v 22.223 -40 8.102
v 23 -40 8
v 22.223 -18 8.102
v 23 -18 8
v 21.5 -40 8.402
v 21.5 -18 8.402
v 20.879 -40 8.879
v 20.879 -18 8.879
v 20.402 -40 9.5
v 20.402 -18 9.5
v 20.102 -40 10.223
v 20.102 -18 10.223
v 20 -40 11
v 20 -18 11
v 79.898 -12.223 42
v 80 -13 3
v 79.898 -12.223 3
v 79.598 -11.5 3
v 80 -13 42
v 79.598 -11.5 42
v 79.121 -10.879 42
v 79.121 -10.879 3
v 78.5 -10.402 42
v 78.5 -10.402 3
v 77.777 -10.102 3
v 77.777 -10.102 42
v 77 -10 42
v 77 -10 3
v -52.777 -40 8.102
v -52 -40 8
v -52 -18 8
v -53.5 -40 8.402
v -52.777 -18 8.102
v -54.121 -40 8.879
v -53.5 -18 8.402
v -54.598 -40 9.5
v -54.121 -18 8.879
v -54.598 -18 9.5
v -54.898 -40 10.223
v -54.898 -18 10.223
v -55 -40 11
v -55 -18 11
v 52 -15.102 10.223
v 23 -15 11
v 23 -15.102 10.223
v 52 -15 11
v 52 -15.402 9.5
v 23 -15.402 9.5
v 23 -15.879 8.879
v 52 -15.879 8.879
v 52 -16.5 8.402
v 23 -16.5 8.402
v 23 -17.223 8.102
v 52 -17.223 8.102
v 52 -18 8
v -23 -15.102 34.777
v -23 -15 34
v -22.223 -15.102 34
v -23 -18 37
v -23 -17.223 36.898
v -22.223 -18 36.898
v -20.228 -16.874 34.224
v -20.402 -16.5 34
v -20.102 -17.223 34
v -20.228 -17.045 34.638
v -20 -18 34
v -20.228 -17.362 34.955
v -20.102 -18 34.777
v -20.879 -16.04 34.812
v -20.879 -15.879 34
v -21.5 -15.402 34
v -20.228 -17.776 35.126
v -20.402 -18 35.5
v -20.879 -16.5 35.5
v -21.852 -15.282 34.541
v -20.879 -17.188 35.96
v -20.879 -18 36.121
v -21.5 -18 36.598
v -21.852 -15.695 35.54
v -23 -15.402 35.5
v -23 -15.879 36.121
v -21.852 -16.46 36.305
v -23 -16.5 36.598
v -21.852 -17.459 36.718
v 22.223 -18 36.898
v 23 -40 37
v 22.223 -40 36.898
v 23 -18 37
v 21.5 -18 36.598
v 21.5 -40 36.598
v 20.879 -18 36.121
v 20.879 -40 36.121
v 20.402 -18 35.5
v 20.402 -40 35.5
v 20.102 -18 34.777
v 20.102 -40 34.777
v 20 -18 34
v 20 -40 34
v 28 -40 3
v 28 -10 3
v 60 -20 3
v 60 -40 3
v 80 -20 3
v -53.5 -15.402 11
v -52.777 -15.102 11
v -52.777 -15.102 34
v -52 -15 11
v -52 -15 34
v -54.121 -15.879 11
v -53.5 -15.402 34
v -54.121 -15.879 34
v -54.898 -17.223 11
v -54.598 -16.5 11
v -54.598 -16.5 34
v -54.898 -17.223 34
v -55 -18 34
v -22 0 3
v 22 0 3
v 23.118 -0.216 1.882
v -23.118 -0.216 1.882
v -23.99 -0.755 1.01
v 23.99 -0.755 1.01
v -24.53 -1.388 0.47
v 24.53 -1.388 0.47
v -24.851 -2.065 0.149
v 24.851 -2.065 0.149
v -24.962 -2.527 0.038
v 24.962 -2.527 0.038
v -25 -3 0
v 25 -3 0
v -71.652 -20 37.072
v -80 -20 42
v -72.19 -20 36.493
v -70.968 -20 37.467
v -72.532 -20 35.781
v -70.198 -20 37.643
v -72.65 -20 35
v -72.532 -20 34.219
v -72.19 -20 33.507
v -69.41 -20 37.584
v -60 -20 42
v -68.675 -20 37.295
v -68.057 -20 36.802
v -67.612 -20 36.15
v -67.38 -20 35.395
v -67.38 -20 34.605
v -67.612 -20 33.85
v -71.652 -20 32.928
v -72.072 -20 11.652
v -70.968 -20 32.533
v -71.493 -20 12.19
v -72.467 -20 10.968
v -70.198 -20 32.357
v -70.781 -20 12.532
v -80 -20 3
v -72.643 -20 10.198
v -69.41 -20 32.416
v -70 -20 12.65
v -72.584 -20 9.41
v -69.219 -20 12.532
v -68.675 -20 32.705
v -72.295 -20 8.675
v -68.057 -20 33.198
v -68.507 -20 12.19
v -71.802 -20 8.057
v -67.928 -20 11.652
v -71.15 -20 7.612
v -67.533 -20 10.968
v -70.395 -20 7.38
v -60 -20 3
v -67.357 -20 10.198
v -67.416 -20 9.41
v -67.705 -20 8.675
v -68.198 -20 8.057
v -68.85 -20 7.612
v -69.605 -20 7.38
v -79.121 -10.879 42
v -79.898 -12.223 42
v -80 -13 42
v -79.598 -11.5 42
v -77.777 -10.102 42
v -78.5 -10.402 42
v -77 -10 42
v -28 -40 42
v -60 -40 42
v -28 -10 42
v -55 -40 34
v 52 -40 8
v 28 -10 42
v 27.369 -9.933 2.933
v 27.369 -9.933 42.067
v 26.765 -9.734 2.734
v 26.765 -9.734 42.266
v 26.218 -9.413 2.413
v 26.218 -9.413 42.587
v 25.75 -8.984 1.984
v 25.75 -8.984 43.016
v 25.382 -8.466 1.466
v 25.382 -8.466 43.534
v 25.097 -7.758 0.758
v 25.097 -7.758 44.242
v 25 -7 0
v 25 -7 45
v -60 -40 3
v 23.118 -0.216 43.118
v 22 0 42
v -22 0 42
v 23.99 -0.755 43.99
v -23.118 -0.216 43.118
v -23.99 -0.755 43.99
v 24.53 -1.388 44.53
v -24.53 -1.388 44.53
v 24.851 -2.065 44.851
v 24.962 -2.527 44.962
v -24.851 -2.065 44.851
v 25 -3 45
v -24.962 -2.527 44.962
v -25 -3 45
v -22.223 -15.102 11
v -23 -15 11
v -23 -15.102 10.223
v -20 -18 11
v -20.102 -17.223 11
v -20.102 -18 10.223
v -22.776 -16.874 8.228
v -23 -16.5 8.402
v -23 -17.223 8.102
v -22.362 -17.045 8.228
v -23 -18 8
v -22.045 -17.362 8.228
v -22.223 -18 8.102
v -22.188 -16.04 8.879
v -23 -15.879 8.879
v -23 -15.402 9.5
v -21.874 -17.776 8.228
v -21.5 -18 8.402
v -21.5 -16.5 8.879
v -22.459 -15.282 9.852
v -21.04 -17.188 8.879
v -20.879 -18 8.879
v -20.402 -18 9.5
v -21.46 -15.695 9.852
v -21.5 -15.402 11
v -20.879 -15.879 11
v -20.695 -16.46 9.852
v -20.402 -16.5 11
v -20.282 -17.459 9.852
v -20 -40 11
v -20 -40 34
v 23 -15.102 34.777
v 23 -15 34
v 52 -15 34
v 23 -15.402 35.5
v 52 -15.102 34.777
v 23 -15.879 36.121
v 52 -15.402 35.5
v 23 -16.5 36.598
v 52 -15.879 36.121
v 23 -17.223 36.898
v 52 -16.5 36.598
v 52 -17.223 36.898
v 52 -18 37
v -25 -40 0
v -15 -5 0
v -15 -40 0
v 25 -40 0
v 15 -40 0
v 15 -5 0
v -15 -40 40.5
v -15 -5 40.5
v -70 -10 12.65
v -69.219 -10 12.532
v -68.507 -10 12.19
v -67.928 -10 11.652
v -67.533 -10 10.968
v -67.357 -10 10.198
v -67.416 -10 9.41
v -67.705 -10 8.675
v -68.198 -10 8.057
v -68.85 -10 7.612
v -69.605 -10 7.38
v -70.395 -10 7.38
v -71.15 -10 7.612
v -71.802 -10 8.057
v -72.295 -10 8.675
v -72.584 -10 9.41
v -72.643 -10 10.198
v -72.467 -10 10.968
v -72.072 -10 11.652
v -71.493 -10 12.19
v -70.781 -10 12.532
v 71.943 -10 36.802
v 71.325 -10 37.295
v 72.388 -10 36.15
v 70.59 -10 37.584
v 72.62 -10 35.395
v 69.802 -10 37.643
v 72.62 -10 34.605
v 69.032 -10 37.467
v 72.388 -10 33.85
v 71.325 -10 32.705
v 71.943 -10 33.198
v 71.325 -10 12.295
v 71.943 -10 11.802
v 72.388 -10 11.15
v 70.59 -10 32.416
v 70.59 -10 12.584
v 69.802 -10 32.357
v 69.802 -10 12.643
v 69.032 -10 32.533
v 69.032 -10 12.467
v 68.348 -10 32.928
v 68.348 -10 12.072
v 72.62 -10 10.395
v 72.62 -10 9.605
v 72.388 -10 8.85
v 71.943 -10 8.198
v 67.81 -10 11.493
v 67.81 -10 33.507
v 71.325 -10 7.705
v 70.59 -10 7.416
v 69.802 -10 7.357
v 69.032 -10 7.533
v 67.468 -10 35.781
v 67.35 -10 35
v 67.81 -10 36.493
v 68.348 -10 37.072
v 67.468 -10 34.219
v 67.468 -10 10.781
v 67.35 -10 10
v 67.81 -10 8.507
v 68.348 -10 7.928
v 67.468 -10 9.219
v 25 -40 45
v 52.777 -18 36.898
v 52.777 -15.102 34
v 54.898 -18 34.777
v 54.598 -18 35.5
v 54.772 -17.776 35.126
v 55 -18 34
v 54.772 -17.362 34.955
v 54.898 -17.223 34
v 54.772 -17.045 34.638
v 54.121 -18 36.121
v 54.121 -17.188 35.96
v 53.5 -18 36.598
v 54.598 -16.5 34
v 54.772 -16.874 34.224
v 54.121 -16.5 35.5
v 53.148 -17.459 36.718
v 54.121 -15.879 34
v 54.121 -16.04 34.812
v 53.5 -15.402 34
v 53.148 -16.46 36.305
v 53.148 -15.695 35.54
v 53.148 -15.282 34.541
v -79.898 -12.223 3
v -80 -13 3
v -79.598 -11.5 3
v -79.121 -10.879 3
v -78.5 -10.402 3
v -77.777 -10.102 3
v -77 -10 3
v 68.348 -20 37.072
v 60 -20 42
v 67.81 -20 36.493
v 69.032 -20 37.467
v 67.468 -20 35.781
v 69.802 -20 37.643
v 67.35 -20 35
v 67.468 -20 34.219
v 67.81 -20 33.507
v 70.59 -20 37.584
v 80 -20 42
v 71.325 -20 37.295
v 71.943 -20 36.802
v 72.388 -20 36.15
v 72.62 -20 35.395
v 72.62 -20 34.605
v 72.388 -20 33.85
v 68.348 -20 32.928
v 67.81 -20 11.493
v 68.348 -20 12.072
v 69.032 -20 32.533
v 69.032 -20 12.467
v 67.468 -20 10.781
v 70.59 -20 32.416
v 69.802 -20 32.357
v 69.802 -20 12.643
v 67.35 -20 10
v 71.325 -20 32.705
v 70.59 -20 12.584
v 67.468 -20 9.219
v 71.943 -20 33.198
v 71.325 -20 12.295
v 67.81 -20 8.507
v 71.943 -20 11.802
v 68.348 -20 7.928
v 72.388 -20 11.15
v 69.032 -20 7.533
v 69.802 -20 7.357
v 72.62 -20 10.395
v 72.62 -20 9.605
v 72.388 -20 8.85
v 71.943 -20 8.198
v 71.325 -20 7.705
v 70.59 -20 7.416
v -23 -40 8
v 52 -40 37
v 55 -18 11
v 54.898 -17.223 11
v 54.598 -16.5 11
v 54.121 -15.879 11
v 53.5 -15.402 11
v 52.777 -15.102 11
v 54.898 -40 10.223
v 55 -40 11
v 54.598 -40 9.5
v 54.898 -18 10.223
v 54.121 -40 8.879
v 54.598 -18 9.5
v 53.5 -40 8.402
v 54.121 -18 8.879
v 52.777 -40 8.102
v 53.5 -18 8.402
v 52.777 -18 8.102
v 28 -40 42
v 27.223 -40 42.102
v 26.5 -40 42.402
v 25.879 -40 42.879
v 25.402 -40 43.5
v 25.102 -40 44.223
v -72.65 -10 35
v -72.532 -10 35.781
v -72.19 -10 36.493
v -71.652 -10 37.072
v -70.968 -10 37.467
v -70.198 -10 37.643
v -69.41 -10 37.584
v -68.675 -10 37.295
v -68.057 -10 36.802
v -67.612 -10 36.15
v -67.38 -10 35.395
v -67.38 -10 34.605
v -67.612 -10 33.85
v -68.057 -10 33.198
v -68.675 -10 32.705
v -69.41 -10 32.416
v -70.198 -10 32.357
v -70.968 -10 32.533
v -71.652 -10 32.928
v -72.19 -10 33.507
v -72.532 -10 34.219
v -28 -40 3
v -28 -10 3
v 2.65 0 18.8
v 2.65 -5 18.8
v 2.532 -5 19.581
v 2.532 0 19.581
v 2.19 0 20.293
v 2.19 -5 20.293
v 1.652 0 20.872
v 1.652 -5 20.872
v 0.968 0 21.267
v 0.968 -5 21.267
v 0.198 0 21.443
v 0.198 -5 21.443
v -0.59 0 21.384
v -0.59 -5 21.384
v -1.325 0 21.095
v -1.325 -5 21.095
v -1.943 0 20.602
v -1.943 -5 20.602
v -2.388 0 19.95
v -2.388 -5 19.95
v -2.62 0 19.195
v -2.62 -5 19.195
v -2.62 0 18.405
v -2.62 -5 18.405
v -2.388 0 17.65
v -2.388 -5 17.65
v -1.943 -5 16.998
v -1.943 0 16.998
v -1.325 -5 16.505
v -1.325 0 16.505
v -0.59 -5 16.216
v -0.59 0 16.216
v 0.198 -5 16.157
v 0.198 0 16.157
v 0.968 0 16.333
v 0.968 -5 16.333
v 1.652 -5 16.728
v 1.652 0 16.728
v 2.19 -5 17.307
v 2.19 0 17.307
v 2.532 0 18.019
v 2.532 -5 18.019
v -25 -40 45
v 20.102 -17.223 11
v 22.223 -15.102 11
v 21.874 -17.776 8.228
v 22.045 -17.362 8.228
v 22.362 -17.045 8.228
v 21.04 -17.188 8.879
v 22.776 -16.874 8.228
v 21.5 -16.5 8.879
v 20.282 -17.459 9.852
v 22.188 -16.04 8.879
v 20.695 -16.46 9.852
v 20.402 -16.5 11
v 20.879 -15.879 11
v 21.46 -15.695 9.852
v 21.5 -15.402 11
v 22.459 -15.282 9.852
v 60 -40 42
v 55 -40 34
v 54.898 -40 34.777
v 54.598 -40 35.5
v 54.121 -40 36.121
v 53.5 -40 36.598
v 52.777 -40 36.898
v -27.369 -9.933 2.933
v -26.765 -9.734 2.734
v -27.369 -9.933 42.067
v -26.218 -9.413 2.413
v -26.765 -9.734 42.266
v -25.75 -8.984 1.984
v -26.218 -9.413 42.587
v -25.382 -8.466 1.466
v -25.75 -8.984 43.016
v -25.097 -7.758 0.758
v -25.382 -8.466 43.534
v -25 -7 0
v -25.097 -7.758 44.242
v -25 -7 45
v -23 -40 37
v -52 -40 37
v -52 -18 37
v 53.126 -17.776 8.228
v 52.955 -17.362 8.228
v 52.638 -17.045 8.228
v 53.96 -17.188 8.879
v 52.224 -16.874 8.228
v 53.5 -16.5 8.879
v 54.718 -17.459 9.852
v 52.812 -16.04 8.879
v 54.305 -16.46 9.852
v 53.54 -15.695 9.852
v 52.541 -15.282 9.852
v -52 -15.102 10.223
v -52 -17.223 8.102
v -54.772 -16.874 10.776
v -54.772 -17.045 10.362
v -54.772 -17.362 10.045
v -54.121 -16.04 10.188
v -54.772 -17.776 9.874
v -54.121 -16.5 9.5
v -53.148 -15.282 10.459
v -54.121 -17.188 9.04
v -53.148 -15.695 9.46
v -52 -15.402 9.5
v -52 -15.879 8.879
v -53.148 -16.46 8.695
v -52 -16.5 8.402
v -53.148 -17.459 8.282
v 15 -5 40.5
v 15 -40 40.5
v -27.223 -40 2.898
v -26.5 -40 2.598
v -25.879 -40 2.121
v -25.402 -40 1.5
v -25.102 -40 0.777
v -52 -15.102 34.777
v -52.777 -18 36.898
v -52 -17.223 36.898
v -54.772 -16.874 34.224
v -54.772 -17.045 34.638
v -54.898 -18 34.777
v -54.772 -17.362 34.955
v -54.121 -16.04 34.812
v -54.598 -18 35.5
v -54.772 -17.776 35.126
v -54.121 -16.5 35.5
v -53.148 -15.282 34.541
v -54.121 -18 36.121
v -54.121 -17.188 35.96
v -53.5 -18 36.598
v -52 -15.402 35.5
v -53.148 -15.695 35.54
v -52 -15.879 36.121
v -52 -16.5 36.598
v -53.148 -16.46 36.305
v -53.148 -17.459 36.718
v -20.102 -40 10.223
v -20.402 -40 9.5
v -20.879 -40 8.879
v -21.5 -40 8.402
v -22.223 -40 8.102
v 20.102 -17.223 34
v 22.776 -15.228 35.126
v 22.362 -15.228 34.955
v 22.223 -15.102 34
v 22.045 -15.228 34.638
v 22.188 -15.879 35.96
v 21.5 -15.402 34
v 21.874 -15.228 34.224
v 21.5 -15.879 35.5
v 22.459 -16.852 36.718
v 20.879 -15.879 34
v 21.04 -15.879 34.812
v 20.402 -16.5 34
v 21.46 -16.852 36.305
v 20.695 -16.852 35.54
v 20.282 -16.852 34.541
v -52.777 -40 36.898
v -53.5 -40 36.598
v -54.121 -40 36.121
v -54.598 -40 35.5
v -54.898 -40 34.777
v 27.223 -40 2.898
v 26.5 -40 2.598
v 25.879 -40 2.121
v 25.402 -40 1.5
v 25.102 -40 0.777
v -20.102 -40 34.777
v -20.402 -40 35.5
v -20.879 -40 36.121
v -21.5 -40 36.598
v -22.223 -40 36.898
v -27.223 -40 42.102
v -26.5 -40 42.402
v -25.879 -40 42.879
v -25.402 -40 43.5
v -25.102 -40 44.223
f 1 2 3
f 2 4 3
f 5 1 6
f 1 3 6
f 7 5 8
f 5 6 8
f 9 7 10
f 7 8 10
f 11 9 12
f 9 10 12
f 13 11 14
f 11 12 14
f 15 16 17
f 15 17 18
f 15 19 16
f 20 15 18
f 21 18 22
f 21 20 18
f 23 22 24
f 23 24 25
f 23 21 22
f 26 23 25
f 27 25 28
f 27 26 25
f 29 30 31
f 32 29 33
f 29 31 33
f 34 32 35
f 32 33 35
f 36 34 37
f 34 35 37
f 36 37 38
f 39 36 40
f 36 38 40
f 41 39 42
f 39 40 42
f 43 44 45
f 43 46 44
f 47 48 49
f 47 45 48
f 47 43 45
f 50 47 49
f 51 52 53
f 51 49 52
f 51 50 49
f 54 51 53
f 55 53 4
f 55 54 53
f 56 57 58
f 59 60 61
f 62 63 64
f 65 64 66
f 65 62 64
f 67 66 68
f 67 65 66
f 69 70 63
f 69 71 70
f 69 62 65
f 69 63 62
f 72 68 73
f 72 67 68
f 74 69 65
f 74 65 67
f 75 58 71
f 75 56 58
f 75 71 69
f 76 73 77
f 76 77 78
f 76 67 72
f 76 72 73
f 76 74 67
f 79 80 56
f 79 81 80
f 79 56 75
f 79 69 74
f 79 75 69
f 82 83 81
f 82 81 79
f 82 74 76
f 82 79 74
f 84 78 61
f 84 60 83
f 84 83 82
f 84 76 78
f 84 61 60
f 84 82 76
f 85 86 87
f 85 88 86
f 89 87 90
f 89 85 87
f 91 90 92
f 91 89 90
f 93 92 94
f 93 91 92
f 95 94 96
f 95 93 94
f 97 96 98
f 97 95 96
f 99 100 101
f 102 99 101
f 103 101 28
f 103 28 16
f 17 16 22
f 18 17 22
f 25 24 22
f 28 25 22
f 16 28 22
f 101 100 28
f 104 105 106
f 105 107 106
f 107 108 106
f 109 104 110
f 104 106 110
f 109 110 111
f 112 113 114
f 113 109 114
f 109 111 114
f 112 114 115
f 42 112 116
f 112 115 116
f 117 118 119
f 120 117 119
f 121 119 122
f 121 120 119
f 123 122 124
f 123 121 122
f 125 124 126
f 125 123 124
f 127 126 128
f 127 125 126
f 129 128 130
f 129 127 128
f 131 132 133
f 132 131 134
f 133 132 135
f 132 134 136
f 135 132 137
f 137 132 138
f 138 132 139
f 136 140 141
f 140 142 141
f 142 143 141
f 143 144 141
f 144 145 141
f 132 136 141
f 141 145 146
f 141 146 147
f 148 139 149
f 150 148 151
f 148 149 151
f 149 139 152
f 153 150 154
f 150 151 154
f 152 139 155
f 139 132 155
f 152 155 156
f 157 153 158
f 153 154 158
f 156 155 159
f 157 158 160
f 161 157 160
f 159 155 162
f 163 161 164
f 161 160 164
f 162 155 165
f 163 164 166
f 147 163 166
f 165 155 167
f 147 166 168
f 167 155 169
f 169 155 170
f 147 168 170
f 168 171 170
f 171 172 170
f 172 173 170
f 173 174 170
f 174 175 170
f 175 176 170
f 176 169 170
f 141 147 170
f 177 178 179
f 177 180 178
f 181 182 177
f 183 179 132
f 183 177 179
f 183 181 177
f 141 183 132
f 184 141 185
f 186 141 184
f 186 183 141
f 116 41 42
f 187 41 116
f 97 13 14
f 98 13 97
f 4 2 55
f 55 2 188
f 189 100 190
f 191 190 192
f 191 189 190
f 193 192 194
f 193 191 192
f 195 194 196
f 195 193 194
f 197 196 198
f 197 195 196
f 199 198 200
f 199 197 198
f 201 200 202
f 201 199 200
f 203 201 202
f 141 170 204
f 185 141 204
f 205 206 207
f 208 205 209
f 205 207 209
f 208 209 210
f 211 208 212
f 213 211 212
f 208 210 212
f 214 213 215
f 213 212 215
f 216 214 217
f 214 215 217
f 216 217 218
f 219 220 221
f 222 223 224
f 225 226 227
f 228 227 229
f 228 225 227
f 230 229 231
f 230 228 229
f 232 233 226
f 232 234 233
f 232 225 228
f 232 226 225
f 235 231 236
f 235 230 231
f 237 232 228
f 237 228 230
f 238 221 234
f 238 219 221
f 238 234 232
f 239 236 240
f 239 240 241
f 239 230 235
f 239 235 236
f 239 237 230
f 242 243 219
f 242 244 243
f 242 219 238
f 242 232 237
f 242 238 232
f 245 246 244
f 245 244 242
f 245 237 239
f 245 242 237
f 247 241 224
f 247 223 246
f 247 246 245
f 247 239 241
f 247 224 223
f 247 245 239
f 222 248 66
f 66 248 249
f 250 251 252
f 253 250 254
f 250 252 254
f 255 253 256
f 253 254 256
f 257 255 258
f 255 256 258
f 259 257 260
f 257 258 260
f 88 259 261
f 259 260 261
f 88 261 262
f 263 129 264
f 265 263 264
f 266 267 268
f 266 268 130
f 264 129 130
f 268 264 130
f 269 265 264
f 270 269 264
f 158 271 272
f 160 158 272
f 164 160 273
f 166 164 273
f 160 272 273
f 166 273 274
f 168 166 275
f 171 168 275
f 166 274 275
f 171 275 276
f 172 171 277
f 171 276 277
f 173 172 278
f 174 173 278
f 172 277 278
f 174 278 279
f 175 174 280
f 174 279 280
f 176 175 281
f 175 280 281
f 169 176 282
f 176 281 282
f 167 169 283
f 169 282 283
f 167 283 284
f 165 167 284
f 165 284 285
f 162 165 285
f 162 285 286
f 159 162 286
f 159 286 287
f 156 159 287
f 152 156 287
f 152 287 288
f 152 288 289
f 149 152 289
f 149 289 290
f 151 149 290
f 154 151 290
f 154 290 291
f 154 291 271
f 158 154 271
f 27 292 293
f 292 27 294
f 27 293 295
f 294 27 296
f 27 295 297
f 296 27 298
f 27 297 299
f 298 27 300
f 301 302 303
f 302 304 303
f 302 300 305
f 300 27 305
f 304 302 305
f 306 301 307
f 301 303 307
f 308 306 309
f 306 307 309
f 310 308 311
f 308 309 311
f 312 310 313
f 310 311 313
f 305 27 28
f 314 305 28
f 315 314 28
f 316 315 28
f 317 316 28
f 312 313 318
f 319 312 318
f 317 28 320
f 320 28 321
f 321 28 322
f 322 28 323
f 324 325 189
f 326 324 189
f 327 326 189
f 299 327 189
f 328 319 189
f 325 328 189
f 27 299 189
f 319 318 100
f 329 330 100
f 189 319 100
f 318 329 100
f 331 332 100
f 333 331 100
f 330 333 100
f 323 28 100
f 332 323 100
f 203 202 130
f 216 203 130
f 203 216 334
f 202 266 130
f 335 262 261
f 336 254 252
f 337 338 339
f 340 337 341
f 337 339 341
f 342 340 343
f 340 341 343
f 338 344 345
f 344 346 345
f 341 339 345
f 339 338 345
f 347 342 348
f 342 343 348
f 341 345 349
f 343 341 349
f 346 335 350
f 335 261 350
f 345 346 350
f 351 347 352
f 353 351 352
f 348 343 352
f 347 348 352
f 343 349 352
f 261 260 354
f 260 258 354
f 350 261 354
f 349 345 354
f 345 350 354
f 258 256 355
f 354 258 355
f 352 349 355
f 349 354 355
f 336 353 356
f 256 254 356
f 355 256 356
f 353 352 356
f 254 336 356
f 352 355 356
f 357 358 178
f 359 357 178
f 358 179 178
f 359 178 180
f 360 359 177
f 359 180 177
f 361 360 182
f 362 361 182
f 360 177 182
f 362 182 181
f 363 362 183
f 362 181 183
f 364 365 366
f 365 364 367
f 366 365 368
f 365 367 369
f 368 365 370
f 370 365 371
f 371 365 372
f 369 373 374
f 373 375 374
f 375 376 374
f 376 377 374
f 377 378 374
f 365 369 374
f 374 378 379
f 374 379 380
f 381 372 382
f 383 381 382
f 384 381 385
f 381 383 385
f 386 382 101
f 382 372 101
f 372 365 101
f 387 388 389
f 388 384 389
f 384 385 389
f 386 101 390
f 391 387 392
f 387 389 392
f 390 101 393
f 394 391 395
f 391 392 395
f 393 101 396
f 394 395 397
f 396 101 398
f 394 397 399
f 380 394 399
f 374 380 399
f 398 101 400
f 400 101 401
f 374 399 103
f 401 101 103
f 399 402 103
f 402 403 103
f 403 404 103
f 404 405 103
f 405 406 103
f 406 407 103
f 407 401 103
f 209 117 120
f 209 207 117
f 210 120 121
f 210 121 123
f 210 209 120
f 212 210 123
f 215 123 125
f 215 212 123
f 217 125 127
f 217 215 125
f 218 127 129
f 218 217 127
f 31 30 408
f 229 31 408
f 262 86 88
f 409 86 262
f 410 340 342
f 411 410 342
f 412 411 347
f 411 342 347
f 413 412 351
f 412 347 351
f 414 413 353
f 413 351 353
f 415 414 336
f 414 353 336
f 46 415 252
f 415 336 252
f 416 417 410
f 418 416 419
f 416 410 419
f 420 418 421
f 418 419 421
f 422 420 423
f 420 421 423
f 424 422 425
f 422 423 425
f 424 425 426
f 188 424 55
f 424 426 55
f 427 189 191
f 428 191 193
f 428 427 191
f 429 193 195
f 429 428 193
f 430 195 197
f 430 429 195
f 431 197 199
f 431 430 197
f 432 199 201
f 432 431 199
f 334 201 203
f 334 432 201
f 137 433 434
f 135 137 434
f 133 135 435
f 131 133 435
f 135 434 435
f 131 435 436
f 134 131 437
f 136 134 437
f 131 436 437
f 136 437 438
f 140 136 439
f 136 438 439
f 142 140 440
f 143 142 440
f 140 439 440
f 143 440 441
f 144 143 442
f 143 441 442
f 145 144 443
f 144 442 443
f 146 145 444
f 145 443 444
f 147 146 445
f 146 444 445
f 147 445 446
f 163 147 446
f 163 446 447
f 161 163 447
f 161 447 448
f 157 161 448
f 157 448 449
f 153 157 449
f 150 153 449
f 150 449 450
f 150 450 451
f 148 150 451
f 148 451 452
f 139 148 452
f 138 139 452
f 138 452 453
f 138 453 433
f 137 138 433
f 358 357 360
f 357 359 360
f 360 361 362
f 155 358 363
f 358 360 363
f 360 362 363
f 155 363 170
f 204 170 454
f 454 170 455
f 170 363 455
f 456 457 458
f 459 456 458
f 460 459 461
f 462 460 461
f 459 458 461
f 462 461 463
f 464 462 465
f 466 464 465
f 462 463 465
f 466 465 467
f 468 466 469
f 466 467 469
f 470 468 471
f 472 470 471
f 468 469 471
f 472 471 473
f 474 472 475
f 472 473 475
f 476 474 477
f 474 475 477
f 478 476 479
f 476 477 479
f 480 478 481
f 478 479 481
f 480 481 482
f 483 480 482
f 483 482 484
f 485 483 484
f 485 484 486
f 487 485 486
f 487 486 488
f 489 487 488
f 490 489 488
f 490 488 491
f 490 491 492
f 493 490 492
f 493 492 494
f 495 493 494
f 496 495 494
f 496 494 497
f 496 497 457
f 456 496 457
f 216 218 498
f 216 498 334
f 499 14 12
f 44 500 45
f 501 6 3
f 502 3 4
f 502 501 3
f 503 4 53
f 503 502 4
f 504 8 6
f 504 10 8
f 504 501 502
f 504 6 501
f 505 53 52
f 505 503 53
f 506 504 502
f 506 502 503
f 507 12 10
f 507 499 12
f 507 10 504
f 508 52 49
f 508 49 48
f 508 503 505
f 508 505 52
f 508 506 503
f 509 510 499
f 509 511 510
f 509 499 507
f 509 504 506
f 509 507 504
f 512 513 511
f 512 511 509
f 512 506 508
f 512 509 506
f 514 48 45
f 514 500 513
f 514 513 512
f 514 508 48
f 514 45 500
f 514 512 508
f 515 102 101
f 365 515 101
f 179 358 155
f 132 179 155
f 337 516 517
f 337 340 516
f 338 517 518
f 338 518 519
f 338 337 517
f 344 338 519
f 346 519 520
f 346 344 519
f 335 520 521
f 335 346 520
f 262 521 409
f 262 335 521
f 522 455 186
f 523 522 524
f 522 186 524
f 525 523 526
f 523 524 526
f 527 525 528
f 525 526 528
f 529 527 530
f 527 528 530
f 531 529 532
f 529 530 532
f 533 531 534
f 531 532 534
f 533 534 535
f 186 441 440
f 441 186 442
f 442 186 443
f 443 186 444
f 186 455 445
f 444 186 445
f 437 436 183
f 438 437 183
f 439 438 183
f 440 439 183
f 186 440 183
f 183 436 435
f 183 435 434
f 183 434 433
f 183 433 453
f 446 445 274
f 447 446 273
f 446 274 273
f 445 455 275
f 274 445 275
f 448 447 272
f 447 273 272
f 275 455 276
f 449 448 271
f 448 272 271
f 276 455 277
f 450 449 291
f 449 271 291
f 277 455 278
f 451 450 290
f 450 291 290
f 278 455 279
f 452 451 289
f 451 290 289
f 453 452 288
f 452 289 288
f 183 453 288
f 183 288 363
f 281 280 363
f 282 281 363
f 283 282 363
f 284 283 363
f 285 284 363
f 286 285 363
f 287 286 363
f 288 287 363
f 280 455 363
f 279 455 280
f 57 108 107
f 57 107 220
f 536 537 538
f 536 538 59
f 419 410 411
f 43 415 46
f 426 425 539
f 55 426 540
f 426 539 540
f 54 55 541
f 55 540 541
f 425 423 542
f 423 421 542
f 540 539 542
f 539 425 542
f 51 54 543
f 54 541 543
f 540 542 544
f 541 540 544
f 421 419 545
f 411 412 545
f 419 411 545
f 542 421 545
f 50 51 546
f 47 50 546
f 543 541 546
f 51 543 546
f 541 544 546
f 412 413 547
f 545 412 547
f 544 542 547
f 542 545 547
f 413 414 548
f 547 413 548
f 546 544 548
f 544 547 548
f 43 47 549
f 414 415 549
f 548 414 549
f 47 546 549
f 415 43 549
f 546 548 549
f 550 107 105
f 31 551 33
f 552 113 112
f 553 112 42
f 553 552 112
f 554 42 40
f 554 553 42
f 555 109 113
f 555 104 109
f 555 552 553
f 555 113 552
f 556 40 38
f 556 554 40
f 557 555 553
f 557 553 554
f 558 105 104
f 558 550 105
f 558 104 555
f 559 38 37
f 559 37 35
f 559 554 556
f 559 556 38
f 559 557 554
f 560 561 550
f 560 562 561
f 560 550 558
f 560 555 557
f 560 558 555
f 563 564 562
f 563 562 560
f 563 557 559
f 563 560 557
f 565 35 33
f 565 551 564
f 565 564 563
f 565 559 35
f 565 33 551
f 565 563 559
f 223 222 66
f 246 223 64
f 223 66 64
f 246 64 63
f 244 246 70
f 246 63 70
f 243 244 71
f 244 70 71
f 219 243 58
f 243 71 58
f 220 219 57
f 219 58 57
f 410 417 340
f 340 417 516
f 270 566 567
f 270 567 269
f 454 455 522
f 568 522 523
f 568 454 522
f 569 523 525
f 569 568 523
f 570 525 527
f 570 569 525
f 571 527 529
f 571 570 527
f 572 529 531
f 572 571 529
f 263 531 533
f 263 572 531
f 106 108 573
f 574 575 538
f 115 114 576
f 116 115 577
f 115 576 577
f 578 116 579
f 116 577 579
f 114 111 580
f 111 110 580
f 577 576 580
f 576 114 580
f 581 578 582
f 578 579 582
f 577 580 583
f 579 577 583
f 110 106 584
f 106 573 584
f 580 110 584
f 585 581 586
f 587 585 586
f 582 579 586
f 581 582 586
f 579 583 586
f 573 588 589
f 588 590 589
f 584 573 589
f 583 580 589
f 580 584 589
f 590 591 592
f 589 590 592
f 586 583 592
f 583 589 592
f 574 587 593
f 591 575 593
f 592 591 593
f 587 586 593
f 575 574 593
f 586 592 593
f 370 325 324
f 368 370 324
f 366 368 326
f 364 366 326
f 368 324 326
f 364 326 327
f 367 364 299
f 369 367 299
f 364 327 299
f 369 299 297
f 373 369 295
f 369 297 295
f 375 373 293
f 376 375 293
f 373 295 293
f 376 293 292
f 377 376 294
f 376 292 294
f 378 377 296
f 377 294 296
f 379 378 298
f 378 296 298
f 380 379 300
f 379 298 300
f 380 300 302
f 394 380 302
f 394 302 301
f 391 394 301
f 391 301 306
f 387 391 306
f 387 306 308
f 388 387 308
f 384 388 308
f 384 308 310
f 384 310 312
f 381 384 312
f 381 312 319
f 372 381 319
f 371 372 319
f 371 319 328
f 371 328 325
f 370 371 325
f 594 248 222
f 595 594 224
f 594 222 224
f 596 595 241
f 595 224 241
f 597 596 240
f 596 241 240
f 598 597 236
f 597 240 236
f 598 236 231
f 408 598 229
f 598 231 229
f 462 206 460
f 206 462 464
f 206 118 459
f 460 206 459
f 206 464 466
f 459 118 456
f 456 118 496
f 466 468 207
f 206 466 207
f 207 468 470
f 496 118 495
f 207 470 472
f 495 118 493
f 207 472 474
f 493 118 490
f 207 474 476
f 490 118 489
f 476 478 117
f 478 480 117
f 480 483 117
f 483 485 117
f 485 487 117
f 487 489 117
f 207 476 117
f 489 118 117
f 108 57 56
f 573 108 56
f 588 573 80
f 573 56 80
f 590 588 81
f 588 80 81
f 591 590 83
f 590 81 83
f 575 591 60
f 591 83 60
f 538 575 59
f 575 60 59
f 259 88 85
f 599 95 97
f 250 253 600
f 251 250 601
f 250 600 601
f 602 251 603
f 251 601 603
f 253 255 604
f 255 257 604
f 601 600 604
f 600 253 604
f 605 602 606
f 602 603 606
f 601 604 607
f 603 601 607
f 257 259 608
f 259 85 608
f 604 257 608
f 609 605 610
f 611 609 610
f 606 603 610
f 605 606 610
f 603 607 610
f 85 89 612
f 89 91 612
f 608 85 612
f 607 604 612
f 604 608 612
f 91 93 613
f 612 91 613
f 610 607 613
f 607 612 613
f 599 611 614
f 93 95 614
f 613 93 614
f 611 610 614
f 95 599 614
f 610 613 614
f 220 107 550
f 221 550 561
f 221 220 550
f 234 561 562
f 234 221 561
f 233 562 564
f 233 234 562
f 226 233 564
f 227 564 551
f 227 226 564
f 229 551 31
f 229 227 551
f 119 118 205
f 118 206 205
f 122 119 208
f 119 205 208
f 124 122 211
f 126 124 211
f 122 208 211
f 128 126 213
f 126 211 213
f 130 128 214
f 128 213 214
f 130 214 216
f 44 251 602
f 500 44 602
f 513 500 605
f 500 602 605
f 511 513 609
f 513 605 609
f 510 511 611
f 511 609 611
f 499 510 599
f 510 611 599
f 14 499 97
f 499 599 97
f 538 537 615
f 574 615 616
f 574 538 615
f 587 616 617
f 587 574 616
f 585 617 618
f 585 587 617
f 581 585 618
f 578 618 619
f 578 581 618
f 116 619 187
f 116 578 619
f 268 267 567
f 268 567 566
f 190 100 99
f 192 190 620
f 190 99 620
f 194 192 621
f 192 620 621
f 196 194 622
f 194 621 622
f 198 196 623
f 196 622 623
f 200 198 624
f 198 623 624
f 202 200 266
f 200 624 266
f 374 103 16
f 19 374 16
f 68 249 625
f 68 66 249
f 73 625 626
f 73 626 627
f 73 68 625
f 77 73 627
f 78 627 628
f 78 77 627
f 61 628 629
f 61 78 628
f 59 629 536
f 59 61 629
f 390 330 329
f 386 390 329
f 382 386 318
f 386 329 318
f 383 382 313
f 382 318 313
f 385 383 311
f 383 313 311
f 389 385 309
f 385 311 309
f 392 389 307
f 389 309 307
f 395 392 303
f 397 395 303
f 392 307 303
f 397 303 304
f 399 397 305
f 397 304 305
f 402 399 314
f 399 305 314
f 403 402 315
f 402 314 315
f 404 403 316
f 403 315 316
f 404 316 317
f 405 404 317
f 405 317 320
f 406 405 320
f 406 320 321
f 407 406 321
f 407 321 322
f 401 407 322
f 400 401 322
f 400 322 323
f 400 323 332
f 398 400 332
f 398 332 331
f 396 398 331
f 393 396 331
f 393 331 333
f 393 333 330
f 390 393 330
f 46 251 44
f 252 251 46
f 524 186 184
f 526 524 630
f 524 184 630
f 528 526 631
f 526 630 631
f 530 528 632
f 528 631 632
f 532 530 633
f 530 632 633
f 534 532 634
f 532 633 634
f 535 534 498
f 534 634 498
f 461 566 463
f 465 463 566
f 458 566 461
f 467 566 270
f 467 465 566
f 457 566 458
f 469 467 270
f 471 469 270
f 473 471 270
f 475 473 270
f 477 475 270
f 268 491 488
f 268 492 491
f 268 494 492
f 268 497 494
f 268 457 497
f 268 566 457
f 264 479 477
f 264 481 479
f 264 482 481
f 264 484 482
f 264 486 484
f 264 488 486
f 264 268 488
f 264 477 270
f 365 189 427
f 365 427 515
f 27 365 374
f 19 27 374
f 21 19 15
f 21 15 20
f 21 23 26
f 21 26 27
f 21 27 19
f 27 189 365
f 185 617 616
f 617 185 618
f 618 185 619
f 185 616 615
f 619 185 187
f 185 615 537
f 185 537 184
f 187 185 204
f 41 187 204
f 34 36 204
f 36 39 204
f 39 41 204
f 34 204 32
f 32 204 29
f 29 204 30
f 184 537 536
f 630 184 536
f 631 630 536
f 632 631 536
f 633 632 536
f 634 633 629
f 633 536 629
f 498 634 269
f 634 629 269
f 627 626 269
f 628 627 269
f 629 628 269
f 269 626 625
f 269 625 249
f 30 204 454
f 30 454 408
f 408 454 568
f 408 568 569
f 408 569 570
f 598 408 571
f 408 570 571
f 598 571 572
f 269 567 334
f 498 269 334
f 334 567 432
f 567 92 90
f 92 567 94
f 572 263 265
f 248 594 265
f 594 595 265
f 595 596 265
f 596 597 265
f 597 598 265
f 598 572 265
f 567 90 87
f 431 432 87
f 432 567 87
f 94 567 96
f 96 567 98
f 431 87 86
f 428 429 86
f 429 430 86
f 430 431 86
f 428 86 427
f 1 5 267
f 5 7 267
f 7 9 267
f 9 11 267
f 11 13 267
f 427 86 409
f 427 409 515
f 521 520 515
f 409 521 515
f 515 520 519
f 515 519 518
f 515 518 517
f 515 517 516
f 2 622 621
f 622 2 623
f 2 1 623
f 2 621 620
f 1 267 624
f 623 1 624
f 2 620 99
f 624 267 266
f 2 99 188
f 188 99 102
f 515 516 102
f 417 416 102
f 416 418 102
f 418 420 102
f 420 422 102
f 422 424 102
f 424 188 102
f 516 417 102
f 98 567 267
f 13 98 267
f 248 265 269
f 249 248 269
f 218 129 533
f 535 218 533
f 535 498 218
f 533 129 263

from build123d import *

# Parameters (mm, degrees)
EXTRUDE_1_DEPTH     = 45
SKETCH_2_W          = 30
SKETCH_2_H          = 35
CUT_EXTRUDE_1_DEPTH = 40.5
SKETCH_4_R          = 2.65
CUT_EXTRUDE_2_DEPTH = 40
SKETCH_5_W          = 35
SKETCH_5_H          = 29
CUT_EXTRUDE_3_DEPTH = 25
SKETCH_6_R          = 2.65
CUT_EXTRUDE_4_DEPTH = 97.566039579
SKETCH_7_W          = 55
SKETCH_7_H          = 3
CUT_EXTRUDE_5_DEPTH = 97.566039579
FILLET_1_R          = 3


with BuildPart() as part:
    # 草图1 → 凸台-拉伸1 (new body)
    with BuildSketch(Plane.XY):
        Polygon((25, 0), (-25, 0), (-25, -10), (-80, -10), (-80, -20), (-60, -20), (-60, -40), (60, -40), (60, -20), (80, -20), (80, -10), (25, -10), align=None)
    extrude(amount=EXTRUDE_1_DEPTH)

    # 草图2 → 切除-拉伸1 (cut)
    with BuildSketch(Plane(origin=(0, 0, 0), x_dir=(-1, 0, 0), z_dir=(0, 0, -1))):
        with Locations((0, -22.5)):
            Rectangle(SKETCH_2_W, SKETCH_2_H)
    extrude(amount=-CUT_EXTRUDE_1_DEPTH, mode=Mode.SUBTRACT)

    # 草图4 → 切除-拉伸2 (cut)
    with BuildSketch(Plane.XZ.offset(5)):
        with Locations((0, 18.8)):
            Circle(SKETCH_4_R)
    extrude(amount=-CUT_EXTRUDE_2_DEPTH, mode=Mode.SUBTRACT)

    # 草图5 → 切除-拉伸3 (cut)
    with BuildSketch(Plane.XZ.offset(40)):
        with Locations((-37.5, 22.5)):
            Rectangle(SKETCH_5_W, SKETCH_5_H)
        with Locations((37.5, 22.5)):
            Rectangle(SKETCH_5_W, SKETCH_5_H)
    extrude(amount=-CUT_EXTRUDE_3_DEPTH, mode=Mode.SUBTRACT)

    # 草图6 → 切除-拉伸4 (cut, through all)
    with BuildSketch(Plane(origin=(0, -10, 0), x_dir=(1, 0, 0), z_dir=(0, 1, 0))):
        with Locations(Location((70, -10, 0), (0, 0, 180))):
            Circle(SKETCH_6_R)
        with Locations(Location((70, -35, 0), (0, 0, 180))):
            Circle(SKETCH_6_R)
        with Locations(Location((-70, -35, 0), (0, 0, 180))):
            Circle(SKETCH_6_R)
        with Locations(Location((-70, -10, 0), (0, 0, 270))):
            Circle(SKETCH_6_R)
    extrude(amount=-CUT_EXTRUDE_4_DEPTH, mode=Mode.SUBTRACT)

    # 草图7 → 切除-拉伸5 (cut, through all)
    with BuildSketch(Plane(origin=(0, -10, 0), x_dir=(1, 0, 0), z_dir=(0, 1, 0))):
        with Locations((-52.5, -1.5)):
            Rectangle(SKETCH_7_W, SKETCH_7_H)
        with Locations((-52.5, -43.5)):
            Rectangle(SKETCH_7_W, SKETCH_7_H)
        with Locations((52.5, -43.5)):
            Rectangle(SKETCH_7_W, SKETCH_7_H)
        with Locations((52.5, -1.5)):
            Rectangle(SKETCH_7_W, SKETCH_7_H)
    extrude(amount=-CUT_EXTRUDE_5_DEPTH, mode=Mode.SUBTRACT)

    # 圆角1
    fillet_1_edges = [part.edges().sort_by_distance(p)[0] for p in [
        (80, -10, 22.5),
        (-80, -10, 22.5),
        (0, 0, 0),
        (-25, 0, 22.5),
        (0, 0, 45),
        (25, 0, 22.5),
        (25, -25, 42),
        (-25, -25, 42),
        (-25, -10, 22.5),
        (-25, -25, 3),
        (25, -25, 3),
        (25, -10, 22.5),
        (-37.5, -15, 37),
        (-20, -15, 22.5),
        (-37.5, -15, 8),
        (-55, -15, 22.5),
        (-55, -27.5, 37),
        (-20, -27.5, 37),
        (-20, -27.5, 8),
        (-55, -27.5, 8),
        (20, -27.5, 37),
        (37.5, -15, 37),
        (55, -27.5, 37),
        (55, -15, 22.5),
        (20, -15, 22.5),
        (20, -27.5, 8),
        (55, -27.5, 8),
        (37.5, -15, 8),
    ]]
    fillet(fillet_1_edges, radius=FILLET_1_R - 0.0001)  # a hair under: the kernel refuses the full size


solid = part.part
